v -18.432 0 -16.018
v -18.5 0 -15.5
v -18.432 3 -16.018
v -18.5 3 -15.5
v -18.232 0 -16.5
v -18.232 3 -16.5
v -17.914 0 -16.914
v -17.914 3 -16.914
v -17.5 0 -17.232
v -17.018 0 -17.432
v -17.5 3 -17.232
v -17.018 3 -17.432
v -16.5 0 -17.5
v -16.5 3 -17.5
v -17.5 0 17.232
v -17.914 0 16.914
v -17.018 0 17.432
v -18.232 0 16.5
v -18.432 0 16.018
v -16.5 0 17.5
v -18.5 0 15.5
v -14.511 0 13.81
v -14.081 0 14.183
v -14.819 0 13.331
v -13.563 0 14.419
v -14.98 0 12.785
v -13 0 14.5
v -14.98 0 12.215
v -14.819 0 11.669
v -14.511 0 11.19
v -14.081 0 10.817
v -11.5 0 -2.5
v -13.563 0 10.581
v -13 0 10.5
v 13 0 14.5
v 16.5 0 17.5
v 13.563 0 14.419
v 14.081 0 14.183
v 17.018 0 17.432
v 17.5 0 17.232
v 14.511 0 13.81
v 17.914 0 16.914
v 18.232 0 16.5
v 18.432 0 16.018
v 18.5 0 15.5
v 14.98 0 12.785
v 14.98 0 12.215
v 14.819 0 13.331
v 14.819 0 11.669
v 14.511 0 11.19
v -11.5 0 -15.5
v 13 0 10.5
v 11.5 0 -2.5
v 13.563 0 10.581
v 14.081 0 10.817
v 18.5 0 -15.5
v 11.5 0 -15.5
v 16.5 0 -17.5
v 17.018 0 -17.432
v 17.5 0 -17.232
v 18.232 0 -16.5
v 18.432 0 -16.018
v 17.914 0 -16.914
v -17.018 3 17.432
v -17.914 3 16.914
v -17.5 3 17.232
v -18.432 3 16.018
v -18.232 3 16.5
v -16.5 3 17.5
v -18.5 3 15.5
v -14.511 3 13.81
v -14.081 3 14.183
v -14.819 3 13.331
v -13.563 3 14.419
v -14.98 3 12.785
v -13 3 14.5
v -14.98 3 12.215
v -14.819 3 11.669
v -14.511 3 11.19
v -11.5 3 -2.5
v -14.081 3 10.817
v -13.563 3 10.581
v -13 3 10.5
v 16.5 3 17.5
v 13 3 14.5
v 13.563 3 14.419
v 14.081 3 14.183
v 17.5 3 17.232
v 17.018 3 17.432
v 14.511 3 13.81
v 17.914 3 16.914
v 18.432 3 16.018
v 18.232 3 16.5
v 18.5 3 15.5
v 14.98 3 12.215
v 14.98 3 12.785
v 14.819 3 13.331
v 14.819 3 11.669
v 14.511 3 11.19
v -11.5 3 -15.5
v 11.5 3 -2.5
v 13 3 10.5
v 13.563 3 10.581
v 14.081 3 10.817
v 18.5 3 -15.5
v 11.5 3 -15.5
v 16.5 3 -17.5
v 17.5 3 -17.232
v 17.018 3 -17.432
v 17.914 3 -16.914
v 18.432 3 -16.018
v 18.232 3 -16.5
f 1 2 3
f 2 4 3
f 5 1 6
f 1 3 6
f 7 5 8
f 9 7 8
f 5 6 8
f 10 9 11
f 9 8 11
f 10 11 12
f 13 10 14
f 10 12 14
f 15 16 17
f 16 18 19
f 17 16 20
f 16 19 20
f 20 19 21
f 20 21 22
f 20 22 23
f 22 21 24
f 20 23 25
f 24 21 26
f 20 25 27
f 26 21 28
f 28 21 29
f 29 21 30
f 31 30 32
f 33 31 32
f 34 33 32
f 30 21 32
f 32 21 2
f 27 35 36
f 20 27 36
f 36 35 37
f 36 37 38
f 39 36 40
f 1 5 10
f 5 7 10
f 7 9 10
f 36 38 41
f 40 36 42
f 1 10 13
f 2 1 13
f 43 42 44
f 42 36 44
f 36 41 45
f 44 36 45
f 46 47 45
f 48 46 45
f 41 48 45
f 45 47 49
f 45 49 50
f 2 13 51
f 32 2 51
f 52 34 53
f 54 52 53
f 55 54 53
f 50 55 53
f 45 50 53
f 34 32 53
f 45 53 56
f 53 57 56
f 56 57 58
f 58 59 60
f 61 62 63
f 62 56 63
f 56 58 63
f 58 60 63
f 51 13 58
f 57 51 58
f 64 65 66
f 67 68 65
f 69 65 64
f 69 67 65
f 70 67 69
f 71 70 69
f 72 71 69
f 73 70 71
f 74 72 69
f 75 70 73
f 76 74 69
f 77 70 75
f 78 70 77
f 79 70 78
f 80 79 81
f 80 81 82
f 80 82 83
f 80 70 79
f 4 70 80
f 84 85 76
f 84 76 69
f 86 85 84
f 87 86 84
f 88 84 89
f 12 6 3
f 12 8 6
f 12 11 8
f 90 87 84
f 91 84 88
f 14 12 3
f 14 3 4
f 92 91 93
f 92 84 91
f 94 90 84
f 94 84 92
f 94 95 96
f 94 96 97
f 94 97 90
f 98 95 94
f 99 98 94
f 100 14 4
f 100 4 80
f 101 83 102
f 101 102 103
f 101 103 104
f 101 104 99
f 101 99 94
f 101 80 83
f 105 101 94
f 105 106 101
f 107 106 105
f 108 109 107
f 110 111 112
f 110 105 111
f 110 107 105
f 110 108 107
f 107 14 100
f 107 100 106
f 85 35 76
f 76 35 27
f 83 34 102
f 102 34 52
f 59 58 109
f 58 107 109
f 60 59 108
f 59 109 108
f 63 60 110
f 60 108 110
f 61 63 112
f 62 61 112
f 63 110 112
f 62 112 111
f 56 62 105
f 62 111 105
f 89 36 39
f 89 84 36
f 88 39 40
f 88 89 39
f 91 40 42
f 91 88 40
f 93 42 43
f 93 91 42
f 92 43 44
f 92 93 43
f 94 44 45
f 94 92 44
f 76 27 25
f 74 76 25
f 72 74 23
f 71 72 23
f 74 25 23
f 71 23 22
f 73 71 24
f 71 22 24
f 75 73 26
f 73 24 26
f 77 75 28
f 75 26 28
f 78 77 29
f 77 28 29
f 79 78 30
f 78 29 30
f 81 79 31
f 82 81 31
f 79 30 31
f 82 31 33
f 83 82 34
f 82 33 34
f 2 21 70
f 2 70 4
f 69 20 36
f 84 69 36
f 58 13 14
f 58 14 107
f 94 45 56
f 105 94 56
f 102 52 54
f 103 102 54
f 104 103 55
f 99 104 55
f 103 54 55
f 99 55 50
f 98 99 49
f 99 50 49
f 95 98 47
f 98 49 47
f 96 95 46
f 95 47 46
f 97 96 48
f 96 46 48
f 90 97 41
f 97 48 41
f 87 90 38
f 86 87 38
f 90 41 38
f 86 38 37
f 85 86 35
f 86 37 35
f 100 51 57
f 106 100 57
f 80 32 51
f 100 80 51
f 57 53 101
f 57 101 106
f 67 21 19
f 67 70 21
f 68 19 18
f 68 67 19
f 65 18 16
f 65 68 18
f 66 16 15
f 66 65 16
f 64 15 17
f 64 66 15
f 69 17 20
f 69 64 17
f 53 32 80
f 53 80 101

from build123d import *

# Parameters (mm, degrees)
SKETCH1_W           = 37
SKETCH1_H           = 35
SKETCH1_W_2         = 23
SKETCH1_H_2         = 13
BOSS_EXTRUDE1_DEPTH = 3
FILLET1_R           = 2


with BuildPart() as part:
    # Sketch1 → Boss-Extrude1 (new body)
    with BuildSketch(Plane(origin=(0, 0, 0), x_dir=(1, 0, 0), z_dir=(0, 1, 0))):
        Rectangle(SKETCH1_W, SKETCH1_H)
        with Locations((0, 9)):
            Rectangle(SKETCH1_W_2, SKETCH1_H_2, mode=Mode.SUBTRACT)
        with BuildLine():
            Line((-13, -10.5), (13, -10.5))
            ThreePointArc((13, -10.5), (15, -12.5), (13, -14.5))
            Line((13, -14.5), (-13, -14.5))
            ThreePointArc((-13, -14.5), (-15, -12.5), (-13, -10.5))
        make_face(mode=Mode.SUBTRACT)
    extrude(amount=BOSS_EXTRUDE1_DEPTH)

    # Fillet1
    fillet1_edges = [part.edges().sort_by_distance(p)[0] for p in [
        (18.5, 1.5, 17.5),
        (-18.5, 1.5, 17.5),
        (-18.5, 1.5, -17.5),
        (18.5, 1.5, -17.5),
    ]]
    fillet(fillet1_edges, radius=FILLET1_R)


solid = part.part
